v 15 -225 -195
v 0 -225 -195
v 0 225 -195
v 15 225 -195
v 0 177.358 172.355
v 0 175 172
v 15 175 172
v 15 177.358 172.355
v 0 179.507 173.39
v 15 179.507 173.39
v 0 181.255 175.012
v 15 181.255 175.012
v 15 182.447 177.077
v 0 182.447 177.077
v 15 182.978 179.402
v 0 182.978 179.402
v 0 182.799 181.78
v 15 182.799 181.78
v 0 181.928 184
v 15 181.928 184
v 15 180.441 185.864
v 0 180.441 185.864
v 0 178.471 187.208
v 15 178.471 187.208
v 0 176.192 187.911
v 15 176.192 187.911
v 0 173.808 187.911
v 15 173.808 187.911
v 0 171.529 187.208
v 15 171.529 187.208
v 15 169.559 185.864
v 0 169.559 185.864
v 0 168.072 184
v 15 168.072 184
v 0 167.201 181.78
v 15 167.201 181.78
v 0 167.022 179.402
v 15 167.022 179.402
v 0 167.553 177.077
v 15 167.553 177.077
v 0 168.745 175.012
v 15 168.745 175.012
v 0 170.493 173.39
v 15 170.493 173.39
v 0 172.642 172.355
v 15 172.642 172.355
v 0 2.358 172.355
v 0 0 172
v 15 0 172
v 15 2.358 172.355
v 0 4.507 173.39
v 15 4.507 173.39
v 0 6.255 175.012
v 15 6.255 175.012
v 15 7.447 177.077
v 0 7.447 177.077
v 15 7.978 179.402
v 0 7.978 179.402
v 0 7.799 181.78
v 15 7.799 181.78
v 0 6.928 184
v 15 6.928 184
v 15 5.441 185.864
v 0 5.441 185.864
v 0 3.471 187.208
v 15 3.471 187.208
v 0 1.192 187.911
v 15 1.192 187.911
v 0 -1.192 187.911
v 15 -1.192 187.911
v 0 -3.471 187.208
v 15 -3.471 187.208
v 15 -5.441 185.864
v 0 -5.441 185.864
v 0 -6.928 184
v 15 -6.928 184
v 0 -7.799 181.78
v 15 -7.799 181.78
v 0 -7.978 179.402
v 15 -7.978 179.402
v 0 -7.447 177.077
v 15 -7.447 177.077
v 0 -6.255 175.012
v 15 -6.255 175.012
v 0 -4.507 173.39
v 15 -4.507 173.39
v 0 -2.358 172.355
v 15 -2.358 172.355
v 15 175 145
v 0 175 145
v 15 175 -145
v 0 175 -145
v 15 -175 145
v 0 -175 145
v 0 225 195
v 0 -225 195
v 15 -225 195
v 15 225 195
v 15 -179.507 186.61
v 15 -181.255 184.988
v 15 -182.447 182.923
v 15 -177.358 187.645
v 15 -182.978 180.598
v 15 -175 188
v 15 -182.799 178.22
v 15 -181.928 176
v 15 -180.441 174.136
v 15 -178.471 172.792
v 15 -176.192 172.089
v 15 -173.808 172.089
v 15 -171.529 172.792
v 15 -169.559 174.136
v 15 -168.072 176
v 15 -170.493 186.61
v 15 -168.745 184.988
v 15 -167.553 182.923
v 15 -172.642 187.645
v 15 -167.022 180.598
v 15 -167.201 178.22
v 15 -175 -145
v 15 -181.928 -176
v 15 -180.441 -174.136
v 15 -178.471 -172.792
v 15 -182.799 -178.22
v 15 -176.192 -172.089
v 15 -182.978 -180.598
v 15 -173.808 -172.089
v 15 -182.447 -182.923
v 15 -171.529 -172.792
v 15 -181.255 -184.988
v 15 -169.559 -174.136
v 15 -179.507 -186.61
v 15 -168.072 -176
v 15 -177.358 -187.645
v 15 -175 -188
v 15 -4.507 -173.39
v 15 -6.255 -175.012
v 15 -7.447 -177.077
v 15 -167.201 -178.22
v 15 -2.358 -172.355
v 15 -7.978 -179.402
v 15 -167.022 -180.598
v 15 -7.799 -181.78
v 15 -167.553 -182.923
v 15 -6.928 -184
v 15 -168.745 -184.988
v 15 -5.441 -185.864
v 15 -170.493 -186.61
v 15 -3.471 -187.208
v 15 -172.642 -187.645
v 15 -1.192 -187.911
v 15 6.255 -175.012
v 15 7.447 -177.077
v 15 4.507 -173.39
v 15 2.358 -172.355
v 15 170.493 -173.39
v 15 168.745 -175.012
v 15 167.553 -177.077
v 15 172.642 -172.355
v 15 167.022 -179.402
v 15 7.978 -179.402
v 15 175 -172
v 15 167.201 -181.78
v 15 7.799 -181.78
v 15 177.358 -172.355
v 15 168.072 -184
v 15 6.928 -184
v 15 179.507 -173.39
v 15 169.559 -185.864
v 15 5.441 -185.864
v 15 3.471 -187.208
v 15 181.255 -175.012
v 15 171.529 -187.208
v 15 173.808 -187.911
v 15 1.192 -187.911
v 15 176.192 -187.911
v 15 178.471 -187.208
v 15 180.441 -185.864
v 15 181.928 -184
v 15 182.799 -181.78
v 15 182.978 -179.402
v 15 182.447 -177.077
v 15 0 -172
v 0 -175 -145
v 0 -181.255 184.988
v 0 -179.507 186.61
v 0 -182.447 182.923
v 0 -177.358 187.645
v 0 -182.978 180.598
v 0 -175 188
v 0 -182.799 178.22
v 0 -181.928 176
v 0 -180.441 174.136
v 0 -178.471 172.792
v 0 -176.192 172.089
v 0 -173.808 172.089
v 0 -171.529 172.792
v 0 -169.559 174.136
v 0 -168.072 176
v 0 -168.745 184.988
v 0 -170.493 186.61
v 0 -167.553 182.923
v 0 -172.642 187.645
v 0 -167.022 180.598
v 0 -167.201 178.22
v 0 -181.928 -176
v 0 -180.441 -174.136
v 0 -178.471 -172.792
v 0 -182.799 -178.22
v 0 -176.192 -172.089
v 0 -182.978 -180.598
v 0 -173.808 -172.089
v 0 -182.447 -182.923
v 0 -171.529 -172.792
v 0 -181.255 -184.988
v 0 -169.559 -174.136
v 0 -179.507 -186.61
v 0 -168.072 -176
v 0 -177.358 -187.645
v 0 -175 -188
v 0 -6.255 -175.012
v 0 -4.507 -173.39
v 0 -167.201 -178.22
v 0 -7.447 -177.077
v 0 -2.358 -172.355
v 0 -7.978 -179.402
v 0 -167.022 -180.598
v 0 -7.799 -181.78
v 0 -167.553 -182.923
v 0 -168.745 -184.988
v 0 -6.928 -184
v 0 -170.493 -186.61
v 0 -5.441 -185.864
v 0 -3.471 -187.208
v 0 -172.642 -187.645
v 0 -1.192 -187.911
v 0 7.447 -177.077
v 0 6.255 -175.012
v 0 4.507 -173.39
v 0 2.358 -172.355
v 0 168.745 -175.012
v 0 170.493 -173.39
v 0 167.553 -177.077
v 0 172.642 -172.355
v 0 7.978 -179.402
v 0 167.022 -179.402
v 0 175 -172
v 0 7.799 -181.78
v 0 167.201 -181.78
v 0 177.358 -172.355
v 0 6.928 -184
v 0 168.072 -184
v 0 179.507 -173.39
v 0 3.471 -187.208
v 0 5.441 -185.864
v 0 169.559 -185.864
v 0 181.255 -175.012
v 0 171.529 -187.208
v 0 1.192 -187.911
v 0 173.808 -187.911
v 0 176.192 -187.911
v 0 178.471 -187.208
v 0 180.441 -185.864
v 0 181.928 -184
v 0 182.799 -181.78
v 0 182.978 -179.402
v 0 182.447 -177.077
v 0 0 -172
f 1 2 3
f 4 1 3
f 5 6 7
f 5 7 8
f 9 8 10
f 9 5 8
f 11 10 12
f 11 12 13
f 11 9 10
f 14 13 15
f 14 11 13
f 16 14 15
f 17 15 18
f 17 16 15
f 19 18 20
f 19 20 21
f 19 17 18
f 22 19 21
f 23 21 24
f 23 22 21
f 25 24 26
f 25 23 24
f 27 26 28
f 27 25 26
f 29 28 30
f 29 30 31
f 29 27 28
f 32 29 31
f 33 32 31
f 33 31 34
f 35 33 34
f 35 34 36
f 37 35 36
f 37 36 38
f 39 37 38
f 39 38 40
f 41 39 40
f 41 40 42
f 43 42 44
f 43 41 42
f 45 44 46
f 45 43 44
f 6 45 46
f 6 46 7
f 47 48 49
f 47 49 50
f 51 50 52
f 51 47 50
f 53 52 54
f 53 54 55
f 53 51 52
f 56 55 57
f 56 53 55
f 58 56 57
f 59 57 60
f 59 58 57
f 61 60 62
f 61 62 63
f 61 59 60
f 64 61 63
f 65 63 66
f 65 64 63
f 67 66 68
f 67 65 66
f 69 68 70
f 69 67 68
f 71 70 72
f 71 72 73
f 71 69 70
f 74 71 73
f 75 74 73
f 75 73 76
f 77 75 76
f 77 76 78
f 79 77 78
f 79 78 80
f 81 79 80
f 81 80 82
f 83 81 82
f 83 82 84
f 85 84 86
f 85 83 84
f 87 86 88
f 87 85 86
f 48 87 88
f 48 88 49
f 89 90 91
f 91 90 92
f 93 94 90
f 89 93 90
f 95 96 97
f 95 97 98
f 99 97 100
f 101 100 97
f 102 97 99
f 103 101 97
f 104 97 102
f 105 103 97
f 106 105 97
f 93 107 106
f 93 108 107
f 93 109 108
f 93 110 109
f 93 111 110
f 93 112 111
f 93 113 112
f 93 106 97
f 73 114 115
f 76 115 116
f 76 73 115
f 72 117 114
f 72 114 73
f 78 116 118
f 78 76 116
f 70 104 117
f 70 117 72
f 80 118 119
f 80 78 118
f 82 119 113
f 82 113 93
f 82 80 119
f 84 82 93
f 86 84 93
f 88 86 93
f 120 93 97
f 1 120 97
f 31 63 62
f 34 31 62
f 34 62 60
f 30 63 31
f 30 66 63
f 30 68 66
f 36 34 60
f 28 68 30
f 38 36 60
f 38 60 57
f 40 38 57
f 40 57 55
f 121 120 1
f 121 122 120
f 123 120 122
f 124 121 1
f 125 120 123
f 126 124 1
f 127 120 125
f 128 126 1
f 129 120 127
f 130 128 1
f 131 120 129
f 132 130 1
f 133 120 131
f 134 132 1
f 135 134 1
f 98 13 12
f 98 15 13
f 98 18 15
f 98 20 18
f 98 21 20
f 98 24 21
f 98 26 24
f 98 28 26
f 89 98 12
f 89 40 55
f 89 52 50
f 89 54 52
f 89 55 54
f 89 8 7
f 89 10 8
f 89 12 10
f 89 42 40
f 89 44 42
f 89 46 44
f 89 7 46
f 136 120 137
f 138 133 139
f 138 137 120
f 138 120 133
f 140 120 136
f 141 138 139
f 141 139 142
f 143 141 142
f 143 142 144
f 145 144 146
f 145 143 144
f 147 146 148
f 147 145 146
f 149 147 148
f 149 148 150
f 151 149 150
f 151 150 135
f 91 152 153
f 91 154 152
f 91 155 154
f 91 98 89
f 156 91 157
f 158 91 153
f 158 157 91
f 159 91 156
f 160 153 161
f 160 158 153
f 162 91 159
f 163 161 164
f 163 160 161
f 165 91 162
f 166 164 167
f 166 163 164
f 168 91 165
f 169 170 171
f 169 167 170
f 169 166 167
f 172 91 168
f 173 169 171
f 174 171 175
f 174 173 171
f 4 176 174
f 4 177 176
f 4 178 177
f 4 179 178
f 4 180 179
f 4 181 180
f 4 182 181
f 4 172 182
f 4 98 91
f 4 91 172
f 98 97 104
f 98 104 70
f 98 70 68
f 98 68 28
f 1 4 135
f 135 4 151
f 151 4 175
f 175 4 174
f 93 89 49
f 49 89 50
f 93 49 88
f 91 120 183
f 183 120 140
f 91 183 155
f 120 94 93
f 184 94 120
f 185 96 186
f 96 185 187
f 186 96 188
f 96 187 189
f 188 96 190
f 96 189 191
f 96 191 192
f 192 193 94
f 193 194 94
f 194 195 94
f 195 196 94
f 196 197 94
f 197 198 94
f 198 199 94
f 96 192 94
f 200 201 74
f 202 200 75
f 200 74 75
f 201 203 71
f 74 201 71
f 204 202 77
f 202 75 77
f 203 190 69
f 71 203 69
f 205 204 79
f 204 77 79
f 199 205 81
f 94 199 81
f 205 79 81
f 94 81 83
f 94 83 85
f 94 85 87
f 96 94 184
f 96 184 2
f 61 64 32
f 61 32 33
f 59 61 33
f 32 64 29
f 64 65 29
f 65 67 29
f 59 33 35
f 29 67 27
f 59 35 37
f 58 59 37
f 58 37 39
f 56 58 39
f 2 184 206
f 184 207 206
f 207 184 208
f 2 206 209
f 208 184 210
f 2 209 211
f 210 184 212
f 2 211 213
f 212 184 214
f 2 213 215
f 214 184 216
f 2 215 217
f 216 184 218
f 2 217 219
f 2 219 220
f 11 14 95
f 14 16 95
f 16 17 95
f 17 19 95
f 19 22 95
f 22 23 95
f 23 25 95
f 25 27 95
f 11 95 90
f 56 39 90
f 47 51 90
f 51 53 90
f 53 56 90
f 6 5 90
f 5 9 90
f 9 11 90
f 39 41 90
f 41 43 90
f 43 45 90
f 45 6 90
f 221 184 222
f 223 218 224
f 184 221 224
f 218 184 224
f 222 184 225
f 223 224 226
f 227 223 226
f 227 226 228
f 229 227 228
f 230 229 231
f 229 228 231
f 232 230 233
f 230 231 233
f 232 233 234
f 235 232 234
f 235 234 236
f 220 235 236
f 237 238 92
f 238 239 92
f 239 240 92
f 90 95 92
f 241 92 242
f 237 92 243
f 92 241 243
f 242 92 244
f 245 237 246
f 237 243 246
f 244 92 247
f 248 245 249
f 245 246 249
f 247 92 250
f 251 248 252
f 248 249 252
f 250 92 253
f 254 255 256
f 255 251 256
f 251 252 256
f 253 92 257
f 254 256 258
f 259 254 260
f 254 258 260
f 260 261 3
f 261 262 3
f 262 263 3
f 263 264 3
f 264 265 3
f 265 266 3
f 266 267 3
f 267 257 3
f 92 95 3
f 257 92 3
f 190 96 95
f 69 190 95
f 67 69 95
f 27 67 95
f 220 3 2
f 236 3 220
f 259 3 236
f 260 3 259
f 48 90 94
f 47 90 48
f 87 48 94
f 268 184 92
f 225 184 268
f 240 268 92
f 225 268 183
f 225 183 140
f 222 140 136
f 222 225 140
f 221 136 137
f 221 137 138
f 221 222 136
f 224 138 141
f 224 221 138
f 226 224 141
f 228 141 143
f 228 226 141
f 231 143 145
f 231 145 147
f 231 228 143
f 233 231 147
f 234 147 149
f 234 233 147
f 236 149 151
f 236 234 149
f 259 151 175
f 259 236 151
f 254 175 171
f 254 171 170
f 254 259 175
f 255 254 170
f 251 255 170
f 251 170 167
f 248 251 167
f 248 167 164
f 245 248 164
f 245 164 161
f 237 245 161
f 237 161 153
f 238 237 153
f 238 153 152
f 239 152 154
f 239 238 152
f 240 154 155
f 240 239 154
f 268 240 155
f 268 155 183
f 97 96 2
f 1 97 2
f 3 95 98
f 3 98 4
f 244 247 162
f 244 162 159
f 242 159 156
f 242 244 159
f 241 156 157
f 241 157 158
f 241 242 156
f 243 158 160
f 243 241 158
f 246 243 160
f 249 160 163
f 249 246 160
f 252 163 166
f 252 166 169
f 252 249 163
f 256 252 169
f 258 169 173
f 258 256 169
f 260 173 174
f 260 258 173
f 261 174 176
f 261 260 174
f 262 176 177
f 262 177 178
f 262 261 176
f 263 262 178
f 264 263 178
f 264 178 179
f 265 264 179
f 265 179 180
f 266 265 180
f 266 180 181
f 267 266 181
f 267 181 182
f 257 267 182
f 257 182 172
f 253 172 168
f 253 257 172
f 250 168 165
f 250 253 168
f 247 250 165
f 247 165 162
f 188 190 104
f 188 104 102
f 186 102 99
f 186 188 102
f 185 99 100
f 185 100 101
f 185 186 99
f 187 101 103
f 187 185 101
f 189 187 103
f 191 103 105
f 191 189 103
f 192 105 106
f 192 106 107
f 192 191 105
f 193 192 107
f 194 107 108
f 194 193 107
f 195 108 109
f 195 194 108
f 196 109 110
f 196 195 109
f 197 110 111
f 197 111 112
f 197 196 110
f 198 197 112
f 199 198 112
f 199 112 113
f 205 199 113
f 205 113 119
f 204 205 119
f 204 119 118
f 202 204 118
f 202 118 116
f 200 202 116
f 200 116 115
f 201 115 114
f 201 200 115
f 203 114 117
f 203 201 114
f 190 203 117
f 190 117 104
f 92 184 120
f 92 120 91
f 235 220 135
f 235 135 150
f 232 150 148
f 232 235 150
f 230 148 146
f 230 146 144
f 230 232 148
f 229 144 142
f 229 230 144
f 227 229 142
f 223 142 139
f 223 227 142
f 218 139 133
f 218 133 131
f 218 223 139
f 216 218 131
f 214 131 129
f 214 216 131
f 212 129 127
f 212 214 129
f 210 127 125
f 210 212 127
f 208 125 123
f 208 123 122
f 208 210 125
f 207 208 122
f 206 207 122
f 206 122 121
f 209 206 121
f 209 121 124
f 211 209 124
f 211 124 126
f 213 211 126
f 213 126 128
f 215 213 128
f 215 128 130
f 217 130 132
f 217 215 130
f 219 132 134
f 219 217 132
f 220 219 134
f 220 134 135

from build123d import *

# Parameters (mm, degrees)
SKETCH_1_W      = 390
SKETCH_1_H      = 450
SKETCH_1_R      = 8
SKETCH_1_W_2    = 290
SKETCH_1_H_2    = 350
EXTRUDE_1_DEPTH = 15


with BuildPart() as part:
    # 草图1 → 凸台-拉伸1 (new body)
    with BuildSketch(Plane(origin=(0, 0, 0), x_dir=(0, 0, -1), z_dir=(1, 0, 0))):
        Rectangle(SKETCH_1_W, SKETCH_1_H)
        with Locations((-180, 175)):
            Circle(SKETCH_1_R, mode=Mode.SUBTRACT)
        with Locations(Location((-180, -175, 0), (0, 0, 180))):
            Circle(SKETCH_1_R, mode=Mode.SUBTRACT)
        with Locations((-180, 0)):
            Circle(SKETCH_1_R, mode=Mode.SUBTRACT)
        with Locations(Location((180, 175, 0), (0, 0, 180))):
            Circle(SKETCH_1_R, mode=Mode.SUBTRACT)
        with Locations(Location((180, 0, 0), (0, 0, 180))):
            Circle(SKETCH_1_R, mode=Mode.SUBTRACT)
        with Locations((180, -175)):
            Circle(SKETCH_1_R, mode=Mode.SUBTRACT)
        Rectangle(SKETCH_1_W_2, SKETCH_1_H_2, mode=Mode.SUBTRACT)
    extrude(amount=EXTRUDE_1_DEPTH)


solid = part.part
